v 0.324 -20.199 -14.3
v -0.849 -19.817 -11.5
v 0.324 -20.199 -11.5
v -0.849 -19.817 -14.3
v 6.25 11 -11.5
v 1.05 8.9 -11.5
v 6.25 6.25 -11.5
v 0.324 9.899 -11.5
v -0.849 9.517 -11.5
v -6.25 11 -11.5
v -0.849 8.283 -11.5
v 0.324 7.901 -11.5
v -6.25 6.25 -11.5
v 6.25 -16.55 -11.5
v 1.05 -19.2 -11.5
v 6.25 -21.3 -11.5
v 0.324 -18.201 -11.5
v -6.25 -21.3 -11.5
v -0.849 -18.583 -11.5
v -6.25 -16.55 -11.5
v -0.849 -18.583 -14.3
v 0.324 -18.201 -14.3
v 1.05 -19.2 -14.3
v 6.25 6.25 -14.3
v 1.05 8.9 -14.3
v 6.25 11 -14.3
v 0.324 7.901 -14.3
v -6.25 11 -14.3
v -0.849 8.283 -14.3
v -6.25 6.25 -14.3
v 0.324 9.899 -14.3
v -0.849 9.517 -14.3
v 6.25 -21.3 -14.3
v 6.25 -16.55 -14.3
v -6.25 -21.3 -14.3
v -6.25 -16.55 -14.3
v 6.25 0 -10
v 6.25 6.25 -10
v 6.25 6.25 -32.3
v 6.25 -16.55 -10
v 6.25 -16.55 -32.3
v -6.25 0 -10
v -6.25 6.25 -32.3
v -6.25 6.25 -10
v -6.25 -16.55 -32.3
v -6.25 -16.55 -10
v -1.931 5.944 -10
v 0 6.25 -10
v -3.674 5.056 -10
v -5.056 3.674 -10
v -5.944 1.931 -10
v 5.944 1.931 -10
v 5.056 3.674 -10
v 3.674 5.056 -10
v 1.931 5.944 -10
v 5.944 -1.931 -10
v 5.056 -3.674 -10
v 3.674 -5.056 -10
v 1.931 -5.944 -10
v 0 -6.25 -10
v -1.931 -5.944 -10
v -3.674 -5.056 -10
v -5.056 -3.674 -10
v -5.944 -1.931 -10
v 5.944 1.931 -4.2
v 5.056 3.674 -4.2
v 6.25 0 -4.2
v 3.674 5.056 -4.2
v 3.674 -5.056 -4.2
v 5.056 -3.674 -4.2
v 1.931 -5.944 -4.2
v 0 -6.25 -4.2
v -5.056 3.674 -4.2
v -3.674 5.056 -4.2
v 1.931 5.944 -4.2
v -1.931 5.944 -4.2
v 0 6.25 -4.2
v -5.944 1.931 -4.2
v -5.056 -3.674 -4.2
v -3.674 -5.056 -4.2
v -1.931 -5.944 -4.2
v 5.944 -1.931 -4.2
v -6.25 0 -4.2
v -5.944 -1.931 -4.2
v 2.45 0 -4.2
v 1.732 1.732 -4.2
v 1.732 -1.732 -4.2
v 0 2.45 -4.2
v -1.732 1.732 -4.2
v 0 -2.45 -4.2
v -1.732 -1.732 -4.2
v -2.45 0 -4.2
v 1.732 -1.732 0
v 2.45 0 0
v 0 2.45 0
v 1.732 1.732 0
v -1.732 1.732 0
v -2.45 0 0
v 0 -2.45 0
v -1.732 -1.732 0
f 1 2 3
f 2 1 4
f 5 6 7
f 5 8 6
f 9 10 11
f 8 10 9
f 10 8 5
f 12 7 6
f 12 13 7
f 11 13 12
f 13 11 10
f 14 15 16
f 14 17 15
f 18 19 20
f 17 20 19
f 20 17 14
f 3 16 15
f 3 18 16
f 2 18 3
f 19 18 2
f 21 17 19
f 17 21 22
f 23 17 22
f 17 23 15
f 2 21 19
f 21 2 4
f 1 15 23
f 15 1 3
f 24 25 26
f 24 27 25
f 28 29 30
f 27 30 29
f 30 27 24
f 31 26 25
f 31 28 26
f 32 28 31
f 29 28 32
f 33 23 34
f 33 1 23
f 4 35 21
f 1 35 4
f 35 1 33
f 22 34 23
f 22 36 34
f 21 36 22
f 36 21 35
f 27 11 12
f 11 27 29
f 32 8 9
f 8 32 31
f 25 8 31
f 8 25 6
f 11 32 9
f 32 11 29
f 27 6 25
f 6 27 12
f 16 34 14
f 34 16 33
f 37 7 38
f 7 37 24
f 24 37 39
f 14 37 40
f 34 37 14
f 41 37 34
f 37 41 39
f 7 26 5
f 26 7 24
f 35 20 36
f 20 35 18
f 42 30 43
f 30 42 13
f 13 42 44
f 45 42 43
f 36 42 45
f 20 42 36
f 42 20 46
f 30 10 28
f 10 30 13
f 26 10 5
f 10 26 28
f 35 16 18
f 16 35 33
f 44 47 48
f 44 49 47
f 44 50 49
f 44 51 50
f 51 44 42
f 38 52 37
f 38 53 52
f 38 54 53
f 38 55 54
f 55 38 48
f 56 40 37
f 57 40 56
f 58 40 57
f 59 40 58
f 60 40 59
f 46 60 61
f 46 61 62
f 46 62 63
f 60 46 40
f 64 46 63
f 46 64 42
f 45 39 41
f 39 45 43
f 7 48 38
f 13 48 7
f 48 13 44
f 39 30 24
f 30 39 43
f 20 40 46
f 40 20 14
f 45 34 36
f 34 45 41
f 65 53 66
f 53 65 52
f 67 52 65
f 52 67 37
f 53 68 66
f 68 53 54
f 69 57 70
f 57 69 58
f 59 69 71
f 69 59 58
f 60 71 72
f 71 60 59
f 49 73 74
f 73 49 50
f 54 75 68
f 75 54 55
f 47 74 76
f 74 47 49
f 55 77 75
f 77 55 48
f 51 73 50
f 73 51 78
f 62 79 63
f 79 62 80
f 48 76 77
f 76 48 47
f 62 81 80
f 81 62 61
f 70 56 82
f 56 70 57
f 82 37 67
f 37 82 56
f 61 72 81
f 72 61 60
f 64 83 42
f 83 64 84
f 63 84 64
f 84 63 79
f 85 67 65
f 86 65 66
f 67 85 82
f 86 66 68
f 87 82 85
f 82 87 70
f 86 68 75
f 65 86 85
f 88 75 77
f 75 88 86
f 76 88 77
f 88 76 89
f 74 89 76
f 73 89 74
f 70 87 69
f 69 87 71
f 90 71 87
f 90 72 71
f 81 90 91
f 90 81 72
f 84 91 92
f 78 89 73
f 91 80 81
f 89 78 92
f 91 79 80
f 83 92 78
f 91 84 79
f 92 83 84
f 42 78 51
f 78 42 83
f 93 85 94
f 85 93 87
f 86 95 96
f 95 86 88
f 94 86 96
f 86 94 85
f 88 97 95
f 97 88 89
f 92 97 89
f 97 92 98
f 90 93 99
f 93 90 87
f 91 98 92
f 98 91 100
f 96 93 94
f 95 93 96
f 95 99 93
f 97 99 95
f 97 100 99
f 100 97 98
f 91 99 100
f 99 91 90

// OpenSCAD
// model of and supporting models for a (micro) servo
// author: Christophe VG <contact@christophe.vg>

//$fn = 50;

// examples:
// KY66 SG90 Micro Servo Motor        : 23   x 12.2 x 29   mm
// KY61 MG90S Metal Micro Servo Motor : 22.8 x 12.2 x 28.5 mm
// Tower Pro SG90 Digital             : 23   × 12.2 x 29   mm

// see image drawing dimensions for information
// about measurements a through f to configure the modules

// Kuman MG 90S (=Tower Pro SG90)
$a  = 32.30;  // height bottom to top of spline
$b  = 22.80;  // length short side to side
$cb = 22.30;  // height of body
$ct =  5.8;  // height of turret
$d  = 12.50;  // width long side to side
$e  = 32.30;  // length, including wings
$f  = 18.0;  // height bottom to underside of wings
// wings - to check
$wt =  2.80;        // thinkness of wings
$wd =  2.10;        // diameter of screw holes
$wc =  2.10;        // distance from wing border
// spline
$sd =  4.90;       // diameter

function servo_top() = $a;
function servo_wing_to_top() = $a - $f;
function servo_wing_top() = $f + $wt;

// servo - the 3d model of the servo
// centered around vertical axis through middle of spline
// and leveled around the mounting wings
// default: top-mounted, bottom-mounted via "bottom" parameter/flag
module servo(bottom=true, clearance=0, with_screw_holes=true) {
  x = $d + 2*clearance;
  y = $b + 2*clearance;
  
  translate([-x/2, -(y-x/2), -$a ]) {
    // main body
    cube( [x, y, $cb] );
    // wings
    translate([0, -($e - y)/2, $f]) {
      difference() {
        cube( [x, $e, $wt] );
        // screw holes
        if(with_screw_holes) {
          translate([x/2, $wc, 0])    { cylinder( $wt, d=$wd ); }
          translate([x/2, $e-$wc, 0]) { cylinder( $wt, d=$wd ); } 
        }
      }
    }
    // "turret"
    translate([x/2, y-x/2, $cb ]) {
      cylinder($ct, d=$d);
    }
    // spline
    translate([x/2, y-x/2, $cb + $ct ]) {
      cylinder($a - $cb - $ct, d=$sd);
    }
  }
}

module servo_bottom_mount_inset(clearance=0) {
  x = $d + 2*clearance;
  y = $b + 2*clearance;
  
  translate([-x/2, -(y-x/2), -($cb+$ct) ]) {
    // main body
    cube( [x, y, $cb+$ct] );
    // wings
    translate([0, -($e - y)/2, 0]) {
      difference() {
        cube( [x, $e, $f+$wt] );
      }
    }
  }
}

spline_height = $a - $cb - $ct;
turret_top = $a - spline_height;
top_wings_to_top_turret = turret_top - ($f + $wt);

// translate([0,0,-top_wings_to_top_turret]) {
//   color("red") { servo(bottom=true, clearance=0.2); }
// }
// servo_bottom_mount_inset(clearance=0.2);

// servo_mount - the cutout that can hold the servo
// centered around vertical axis through middle of spline
module servo_mount(t=$a) {
  translate([-$d/2, -($b-$d/2), 0]) {
    // main body
    cube( [$d, $b, t] );
    // screw holes
    translate([0, -($e - $b)/2, 0]) {
      translate([$d/2, $wc, 0])    { cylinder( t, d=$wd ); }
      translate([$d/2, $e-$wc, 0]) { cylinder( t, d=$wd ); } 
    }
  }
}

module demo() {
  difference() {
    cube([ 70, 50, 5 ] );
    translate([25, 25, 0]) { servo_mount(t=5); }
    translate([50, 25, 0]) { servo_mount(t=5); }
  }
  translate([25, 25, 5]) { color("red") { servo(); } }
  // the servo and mount are centered around the spline
  translate([25, 25, -40]) { color("blue") { cylinder(80, d=1); } }
  
  // mount_inset demo
  translate([-25, 25, 0]) {
    translate([0,0,-top_wings_to_top_turret]) {
      color("red") { servo(bottom=true, clearance=0.2); }
    }
    servo_bottom_mount_inset(clearance=0.2);
  }
}

$vpt = [ 16.87, 20.88, 16.90 ];
$vpr = [ 71.10, 0.00, 27.10 ];
$vpd = 310;
//demo();
servo();
